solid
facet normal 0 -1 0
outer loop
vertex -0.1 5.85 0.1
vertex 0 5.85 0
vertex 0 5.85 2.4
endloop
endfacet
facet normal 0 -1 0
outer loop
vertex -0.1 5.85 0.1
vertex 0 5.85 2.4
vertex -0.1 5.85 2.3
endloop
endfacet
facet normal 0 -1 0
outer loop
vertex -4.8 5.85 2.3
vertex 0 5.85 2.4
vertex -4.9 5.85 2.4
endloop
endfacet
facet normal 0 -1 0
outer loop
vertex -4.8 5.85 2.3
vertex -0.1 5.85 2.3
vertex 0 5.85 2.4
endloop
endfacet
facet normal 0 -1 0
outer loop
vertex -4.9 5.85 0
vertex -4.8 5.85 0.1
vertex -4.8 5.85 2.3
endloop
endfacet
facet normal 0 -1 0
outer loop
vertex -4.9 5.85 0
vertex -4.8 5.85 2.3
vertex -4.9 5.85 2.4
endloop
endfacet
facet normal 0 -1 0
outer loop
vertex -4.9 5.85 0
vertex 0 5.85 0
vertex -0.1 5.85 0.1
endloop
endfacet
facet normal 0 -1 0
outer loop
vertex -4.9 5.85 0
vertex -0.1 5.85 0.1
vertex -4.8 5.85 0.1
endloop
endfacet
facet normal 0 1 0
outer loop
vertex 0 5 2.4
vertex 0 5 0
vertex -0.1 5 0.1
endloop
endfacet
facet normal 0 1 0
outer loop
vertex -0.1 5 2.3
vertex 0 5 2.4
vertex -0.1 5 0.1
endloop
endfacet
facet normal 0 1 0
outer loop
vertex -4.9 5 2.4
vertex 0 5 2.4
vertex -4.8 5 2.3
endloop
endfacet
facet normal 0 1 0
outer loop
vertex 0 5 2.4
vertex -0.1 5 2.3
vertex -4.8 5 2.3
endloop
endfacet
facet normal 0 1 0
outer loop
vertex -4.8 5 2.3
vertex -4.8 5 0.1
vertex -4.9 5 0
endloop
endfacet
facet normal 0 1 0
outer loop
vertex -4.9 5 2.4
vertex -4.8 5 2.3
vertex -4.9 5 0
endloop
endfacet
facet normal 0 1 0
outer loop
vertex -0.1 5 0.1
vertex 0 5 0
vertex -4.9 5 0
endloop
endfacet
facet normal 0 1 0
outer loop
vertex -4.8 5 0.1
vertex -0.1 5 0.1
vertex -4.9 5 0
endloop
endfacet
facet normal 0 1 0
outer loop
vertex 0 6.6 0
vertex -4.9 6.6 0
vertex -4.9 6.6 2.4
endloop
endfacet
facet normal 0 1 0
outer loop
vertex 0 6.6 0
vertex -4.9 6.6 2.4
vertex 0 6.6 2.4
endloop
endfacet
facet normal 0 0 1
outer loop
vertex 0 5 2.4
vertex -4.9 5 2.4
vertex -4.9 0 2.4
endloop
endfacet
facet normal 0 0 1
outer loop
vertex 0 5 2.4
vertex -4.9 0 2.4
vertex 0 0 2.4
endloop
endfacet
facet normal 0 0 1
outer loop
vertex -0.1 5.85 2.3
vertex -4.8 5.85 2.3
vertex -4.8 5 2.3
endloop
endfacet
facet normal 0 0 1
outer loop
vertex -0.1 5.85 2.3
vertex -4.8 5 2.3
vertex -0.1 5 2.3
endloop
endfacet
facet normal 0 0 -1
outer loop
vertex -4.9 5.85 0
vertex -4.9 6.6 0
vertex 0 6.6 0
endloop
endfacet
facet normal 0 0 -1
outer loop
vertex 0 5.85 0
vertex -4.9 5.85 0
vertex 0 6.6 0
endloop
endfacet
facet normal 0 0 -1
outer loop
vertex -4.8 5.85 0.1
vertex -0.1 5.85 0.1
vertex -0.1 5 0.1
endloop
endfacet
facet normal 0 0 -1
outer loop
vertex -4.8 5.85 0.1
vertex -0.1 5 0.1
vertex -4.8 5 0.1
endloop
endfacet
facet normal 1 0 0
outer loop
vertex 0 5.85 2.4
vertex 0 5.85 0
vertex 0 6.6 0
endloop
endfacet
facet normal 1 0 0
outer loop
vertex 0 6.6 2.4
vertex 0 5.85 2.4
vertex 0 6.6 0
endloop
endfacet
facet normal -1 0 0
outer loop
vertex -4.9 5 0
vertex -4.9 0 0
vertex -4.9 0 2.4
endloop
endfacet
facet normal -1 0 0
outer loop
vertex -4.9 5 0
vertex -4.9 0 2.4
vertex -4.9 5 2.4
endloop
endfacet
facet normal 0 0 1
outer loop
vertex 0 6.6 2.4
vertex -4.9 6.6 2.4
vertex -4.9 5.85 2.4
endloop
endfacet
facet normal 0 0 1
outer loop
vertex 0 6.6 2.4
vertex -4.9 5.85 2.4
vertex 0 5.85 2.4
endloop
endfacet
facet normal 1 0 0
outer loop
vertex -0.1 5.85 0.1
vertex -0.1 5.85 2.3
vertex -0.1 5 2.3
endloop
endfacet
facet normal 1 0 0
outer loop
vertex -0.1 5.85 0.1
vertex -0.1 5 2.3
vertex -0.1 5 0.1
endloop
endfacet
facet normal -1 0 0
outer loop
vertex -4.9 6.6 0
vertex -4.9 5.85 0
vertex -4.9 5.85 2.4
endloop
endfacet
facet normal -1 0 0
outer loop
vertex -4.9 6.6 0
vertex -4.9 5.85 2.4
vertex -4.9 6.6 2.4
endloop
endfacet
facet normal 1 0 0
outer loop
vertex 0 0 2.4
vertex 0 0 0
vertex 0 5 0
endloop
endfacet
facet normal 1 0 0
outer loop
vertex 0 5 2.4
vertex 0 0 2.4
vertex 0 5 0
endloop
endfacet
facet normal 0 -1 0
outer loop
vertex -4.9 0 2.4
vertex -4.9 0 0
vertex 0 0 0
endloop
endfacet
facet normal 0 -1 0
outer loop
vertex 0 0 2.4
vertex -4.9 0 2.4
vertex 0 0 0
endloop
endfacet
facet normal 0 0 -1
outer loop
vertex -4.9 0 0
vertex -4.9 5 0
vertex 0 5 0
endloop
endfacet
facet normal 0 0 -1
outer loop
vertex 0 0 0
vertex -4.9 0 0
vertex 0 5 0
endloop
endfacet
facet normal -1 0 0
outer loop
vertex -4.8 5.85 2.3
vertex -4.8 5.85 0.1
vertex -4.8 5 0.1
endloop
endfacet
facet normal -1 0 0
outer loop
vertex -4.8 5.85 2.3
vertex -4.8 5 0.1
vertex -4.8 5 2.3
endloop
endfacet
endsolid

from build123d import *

# Parameters (mm, degrees)
SKICA1_W                 = 4.9
SKICA1_H                 = 6.6
P_IDAT_VYSUNUT_M1_DEPTH  = 2.4
SKICA2_W                 = 4.9
SKICA2_H                 = 0.85
ODEBRAT_VYSUNUT_M1_DEPTH = 0.1
SKICA3_W                 = 2.3
SKICA3_H                 = 0.85
ODEBRAT_VYSUNUT_M2_DEPTH = 0.1
SKICA4_W                 = 4.8
SKICA4_H                 = 0.85
ODEBRAT_VYSUNUT_M3_DEPTH = 0.1
SKICA5_W                 = 2.2
SKICA5_H                 = 0.85
ODEBRAT_VYSUNUT_M4_DEPTH = 0.1


with BuildPart() as part:
    # Skica1 → Přidat vysunutím1 (new body)
    with BuildSketch(Plane.XY):
        with Locations((-2.45, 3.3)):
            Rectangle(SKICA1_W, SKICA1_H)
    extrude(amount=P_IDAT_VYSUNUT_M1_DEPTH)

    # Skica2 → Odebrat vysunutím1 (cut)
    with BuildSketch(Plane.XY.offset(2.4)):
        with Locations((-2.45, 5.425)):
            Rectangle(SKICA2_W, SKICA2_H)
    extrude(amount=-ODEBRAT_VYSUNUT_M1_DEPTH, mode=Mode.SUBTRACT)

    # Skica3 → Odebrat vysunutím2 (cut)
    with BuildSketch(Plane(origin=(0, 0, 0), x_dir=(0, 0, -1), z_dir=(1, 0, 0))):
        with Locations((-1.15, 5.425)):
            Rectangle(SKICA3_W, SKICA3_H)
    extrude(amount=-ODEBRAT_VYSUNUT_M2_DEPTH, mode=Mode.SUBTRACT)

    # Skica4 → Odebrat vysunutím3 (cut)
    with BuildSketch(Plane(origin=(0, 0, 0), x_dir=(-1, 0, 0), z_dir=(0, 0, -1))):
        with Locations((2.5, 5.425)):
            Rectangle(SKICA4_W, SKICA4_H)
    extrude(amount=-ODEBRAT_VYSUNUT_M3_DEPTH, mode=Mode.SUBTRACT)

    # Skica5 → Odebrat vysunutím4 (cut)
    with BuildSketch(Plane.ZY.offset(4.9)):
        with Locations((1.2, 5.425)):
            Rectangle(SKICA5_W, SKICA5_H)
    extrude(amount=-ODEBRAT_VYSUNUT_M4_DEPTH, mode=Mode.SUBTRACT)


solid = part.part
